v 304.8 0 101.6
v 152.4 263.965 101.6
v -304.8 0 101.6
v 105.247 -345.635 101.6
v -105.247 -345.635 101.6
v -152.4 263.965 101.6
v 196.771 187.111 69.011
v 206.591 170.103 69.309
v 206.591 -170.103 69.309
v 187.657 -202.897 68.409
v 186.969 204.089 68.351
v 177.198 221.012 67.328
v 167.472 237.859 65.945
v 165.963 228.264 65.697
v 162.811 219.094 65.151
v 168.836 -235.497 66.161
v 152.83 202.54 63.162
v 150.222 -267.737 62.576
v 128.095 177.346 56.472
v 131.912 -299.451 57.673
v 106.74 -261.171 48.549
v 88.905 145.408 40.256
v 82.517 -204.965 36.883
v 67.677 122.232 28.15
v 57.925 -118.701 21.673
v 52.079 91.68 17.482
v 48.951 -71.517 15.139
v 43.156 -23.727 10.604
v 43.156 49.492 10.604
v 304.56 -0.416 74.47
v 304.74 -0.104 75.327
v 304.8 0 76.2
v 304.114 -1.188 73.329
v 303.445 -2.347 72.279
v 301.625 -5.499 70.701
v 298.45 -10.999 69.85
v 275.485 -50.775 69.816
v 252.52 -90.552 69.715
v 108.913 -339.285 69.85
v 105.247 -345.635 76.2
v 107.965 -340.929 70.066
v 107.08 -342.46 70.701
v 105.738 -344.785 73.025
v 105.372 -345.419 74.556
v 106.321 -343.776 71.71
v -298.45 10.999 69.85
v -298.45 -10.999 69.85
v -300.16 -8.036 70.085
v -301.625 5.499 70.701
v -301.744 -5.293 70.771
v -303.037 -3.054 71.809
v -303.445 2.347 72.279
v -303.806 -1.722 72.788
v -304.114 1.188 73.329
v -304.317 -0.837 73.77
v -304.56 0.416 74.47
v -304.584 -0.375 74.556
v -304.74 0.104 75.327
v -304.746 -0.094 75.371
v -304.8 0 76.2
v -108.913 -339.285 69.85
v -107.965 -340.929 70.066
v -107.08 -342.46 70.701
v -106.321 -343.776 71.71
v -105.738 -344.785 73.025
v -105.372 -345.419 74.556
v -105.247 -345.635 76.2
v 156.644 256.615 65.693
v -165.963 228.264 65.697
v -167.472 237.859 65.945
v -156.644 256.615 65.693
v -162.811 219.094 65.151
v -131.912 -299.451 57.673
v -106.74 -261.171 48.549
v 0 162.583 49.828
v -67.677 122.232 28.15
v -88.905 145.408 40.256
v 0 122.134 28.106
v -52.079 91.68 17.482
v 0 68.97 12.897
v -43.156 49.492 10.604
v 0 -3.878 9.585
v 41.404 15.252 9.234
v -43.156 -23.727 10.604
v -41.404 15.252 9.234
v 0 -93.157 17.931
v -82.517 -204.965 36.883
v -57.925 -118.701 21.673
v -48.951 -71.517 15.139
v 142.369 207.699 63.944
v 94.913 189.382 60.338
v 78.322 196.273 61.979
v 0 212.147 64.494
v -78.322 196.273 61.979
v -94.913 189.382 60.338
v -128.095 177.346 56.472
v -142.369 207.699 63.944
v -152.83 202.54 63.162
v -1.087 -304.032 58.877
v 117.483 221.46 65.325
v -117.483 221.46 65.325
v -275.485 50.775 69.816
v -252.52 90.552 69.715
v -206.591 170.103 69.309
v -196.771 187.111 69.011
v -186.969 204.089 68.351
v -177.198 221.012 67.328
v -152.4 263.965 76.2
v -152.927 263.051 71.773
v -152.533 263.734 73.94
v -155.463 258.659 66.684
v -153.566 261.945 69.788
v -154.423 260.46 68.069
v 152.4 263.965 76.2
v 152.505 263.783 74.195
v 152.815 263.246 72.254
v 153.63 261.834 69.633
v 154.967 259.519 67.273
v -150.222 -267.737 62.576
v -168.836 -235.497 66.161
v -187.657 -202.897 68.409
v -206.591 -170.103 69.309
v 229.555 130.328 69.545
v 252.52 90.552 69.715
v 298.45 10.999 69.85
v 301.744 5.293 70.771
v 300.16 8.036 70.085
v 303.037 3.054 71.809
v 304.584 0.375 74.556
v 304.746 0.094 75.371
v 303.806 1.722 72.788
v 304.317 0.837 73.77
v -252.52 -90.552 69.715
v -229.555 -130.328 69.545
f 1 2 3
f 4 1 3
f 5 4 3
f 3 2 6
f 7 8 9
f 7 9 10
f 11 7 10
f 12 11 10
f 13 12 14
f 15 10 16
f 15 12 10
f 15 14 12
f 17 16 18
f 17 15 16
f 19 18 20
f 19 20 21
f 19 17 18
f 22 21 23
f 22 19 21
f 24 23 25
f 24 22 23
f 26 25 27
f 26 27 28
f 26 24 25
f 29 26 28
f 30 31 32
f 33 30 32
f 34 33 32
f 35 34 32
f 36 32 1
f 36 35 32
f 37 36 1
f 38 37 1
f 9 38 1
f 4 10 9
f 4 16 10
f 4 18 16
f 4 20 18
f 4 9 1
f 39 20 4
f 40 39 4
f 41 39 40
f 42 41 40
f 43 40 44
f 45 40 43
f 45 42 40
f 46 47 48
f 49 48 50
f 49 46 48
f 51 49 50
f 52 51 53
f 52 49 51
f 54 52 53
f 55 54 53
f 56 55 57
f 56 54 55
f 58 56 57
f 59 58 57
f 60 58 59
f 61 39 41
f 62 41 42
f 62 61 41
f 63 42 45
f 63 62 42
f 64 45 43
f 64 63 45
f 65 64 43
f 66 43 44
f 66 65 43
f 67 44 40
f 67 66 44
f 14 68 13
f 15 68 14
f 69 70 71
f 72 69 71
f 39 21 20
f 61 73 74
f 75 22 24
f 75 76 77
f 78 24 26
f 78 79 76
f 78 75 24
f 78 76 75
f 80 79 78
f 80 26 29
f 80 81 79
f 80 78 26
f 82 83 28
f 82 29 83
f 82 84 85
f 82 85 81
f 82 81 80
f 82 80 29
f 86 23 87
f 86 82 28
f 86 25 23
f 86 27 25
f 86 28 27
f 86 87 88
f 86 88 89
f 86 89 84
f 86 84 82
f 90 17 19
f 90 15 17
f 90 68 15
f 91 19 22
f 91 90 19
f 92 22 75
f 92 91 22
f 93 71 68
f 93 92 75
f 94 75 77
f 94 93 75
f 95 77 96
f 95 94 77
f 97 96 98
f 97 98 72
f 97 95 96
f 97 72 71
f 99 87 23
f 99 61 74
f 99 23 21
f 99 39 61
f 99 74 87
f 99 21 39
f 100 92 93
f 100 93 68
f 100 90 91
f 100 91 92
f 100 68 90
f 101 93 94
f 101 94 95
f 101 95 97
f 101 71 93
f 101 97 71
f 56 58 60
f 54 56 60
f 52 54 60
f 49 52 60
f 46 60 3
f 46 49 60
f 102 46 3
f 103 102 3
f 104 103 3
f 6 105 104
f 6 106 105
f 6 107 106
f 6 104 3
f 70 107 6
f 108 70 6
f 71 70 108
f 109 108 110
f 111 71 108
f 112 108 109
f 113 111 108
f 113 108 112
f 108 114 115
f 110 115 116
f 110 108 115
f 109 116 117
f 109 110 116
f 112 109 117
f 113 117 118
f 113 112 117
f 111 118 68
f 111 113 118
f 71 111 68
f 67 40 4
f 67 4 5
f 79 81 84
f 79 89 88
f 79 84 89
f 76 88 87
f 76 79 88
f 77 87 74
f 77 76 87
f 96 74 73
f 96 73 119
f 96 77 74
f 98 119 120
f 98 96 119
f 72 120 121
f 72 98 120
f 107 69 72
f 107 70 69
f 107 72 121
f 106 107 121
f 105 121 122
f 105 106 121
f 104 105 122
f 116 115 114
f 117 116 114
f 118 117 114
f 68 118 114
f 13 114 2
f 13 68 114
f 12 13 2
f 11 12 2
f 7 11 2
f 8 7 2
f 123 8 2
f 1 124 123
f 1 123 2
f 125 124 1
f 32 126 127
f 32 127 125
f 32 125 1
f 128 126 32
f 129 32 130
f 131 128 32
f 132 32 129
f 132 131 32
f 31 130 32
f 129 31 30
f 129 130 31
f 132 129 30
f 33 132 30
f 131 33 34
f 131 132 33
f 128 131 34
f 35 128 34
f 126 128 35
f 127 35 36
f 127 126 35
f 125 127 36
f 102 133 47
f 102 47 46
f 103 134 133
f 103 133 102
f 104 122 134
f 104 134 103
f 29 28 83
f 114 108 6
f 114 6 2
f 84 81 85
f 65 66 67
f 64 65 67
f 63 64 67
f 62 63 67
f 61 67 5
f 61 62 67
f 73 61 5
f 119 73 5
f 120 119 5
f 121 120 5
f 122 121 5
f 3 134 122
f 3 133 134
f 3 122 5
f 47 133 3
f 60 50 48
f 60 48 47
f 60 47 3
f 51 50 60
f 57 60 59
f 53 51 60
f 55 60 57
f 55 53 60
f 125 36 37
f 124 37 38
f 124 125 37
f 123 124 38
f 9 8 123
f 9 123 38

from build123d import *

# Parameters (mm, degrees)
BOSS_EXTRUDE1_DEPTH      = 101.6
BOSS_EXTRUDE1_DEPTH_BACK = 25.4
CUT_EXTRUDE5_DEPTH       = 690.084726286
CUT_EXTRUDE7_START       = -167.47195291
CUT_EXTRUDE7_DEPTH       = 334.94390582


with BuildPart() as part:
    # Sketch2 → Boss-Extrude1 (new, two sides: drawn at the far end of the back side and taken through both)
    with BuildSketch(Plane.XY.offset(-BOSS_EXTRUDE1_DEPTH_BACK)):
        Polygon((-152.4, 263.964543073), (152.4, 263.964543073), (304.8, 0), (105.247275902, -345.635456927), (-105.247275902, -345.635456927), (-304.8, 0), align=None)
    extrude(amount=BOSS_EXTRUDE1_DEPTH + BOSS_EXTRUDE1_DEPTH_BACK)

    # Sketch3 → Cut-Extrude5 (cut, through all)
    with BuildSketch(Plane(origin=(0, 263.964543073, 0), x_dir=(1, 0, 0), z_dir=(0, 1, 0))):
        with BuildLine():
            Line((-304.8, -76.2), (-304.8, 25.4))
            Line((-304.8, 25.4), (304.8, 25.4))
            Line((304.8, 25.4), (304.8, -76.2))
            ThreePointArc((304.8, -76.2), (302.940128061, -71.709871939), (298.45, -69.85))
            ThreePointArc((298.45, -69.85), (252.51979015, -69.714637969), (206.591176001, -69.30855658))
            ThreePointArc((206.591176001, -69.30855658), (119.939950937, -53.691572752), (43.155890442, -10.604068265))
            ThreePointArc((43.155890442, -10.604068265), (34.818219716, -4.738506069), (25.792249783, 0))
            ThreePointArc((25.792249783, 0), (0, 5.478791422), (-25.792249783, 0))
            ThreePointArc((-25.792249783, 0), (-34.818219716, -4.738506069), (-43.155890442, -10.604068265))
            ThreePointArc((-43.155890442, -10.604068265), (-119.939950937, -53.691572752), (-206.591176001, -69.30855658))
            ThreePointArc((-206.591176001, -69.30855658), (-252.51979015, -69.714637969), (-298.45, -69.85))
            ThreePointArc((-298.45, -69.85), (-302.940128061, -71.709871939), (-304.8, -76.2))
        make_face()
    extrude(amount=-CUT_EXTRUDE5_DEPTH, mode=Mode.SUBTRACT)

    # Cut-Extrude7: read off the stored shape, not the designer's step
    # Cut-Extrude7 outline → Cut-Extrude7 (cut)
    with BuildSketch(Plane(origin=(0, 0, 0), x_dir=(0, 0, -1), z_dir=(1, 0, 0)).offset(CUT_EXTRUDE7_START)):
        with BuildLine():
            ThreePointArc((-76.2, 263.964543073), (-69.788494044, 261.94466991), (-65.692525933, 256.614534691))
            add(Edge.make_bspline(
                [(-65.692525933, 256.614534691), (-71.486350731, 90.510366485), (-0.882192536, 198.749340281), (23.113391949, 17.574151868), (-16.69864439, -54.274132463), (-38.1, -256.513950378), (-69.85, -339.285456927)],
                knots=[0, 0, 0, 0, 0, 0, 0, 1, 1, 1, 1, 1, 1, 1], degree=6))
            ThreePointArc((-69.85, -339.285456927), (-71.709871939, -343.775584987), (-76.2, -345.635456927))
            Line((-76.2, -345.635456927), (7, -345.635456927))
            Line((7, -345.635456927), (7, 263.964543073))
            Line((7, 263.964543073), (-76.2, 263.964543073))
        make_face()
    extrude(amount=CUT_EXTRUDE7_DEPTH, mode=Mode.SUBTRACT)


solid = part.part
